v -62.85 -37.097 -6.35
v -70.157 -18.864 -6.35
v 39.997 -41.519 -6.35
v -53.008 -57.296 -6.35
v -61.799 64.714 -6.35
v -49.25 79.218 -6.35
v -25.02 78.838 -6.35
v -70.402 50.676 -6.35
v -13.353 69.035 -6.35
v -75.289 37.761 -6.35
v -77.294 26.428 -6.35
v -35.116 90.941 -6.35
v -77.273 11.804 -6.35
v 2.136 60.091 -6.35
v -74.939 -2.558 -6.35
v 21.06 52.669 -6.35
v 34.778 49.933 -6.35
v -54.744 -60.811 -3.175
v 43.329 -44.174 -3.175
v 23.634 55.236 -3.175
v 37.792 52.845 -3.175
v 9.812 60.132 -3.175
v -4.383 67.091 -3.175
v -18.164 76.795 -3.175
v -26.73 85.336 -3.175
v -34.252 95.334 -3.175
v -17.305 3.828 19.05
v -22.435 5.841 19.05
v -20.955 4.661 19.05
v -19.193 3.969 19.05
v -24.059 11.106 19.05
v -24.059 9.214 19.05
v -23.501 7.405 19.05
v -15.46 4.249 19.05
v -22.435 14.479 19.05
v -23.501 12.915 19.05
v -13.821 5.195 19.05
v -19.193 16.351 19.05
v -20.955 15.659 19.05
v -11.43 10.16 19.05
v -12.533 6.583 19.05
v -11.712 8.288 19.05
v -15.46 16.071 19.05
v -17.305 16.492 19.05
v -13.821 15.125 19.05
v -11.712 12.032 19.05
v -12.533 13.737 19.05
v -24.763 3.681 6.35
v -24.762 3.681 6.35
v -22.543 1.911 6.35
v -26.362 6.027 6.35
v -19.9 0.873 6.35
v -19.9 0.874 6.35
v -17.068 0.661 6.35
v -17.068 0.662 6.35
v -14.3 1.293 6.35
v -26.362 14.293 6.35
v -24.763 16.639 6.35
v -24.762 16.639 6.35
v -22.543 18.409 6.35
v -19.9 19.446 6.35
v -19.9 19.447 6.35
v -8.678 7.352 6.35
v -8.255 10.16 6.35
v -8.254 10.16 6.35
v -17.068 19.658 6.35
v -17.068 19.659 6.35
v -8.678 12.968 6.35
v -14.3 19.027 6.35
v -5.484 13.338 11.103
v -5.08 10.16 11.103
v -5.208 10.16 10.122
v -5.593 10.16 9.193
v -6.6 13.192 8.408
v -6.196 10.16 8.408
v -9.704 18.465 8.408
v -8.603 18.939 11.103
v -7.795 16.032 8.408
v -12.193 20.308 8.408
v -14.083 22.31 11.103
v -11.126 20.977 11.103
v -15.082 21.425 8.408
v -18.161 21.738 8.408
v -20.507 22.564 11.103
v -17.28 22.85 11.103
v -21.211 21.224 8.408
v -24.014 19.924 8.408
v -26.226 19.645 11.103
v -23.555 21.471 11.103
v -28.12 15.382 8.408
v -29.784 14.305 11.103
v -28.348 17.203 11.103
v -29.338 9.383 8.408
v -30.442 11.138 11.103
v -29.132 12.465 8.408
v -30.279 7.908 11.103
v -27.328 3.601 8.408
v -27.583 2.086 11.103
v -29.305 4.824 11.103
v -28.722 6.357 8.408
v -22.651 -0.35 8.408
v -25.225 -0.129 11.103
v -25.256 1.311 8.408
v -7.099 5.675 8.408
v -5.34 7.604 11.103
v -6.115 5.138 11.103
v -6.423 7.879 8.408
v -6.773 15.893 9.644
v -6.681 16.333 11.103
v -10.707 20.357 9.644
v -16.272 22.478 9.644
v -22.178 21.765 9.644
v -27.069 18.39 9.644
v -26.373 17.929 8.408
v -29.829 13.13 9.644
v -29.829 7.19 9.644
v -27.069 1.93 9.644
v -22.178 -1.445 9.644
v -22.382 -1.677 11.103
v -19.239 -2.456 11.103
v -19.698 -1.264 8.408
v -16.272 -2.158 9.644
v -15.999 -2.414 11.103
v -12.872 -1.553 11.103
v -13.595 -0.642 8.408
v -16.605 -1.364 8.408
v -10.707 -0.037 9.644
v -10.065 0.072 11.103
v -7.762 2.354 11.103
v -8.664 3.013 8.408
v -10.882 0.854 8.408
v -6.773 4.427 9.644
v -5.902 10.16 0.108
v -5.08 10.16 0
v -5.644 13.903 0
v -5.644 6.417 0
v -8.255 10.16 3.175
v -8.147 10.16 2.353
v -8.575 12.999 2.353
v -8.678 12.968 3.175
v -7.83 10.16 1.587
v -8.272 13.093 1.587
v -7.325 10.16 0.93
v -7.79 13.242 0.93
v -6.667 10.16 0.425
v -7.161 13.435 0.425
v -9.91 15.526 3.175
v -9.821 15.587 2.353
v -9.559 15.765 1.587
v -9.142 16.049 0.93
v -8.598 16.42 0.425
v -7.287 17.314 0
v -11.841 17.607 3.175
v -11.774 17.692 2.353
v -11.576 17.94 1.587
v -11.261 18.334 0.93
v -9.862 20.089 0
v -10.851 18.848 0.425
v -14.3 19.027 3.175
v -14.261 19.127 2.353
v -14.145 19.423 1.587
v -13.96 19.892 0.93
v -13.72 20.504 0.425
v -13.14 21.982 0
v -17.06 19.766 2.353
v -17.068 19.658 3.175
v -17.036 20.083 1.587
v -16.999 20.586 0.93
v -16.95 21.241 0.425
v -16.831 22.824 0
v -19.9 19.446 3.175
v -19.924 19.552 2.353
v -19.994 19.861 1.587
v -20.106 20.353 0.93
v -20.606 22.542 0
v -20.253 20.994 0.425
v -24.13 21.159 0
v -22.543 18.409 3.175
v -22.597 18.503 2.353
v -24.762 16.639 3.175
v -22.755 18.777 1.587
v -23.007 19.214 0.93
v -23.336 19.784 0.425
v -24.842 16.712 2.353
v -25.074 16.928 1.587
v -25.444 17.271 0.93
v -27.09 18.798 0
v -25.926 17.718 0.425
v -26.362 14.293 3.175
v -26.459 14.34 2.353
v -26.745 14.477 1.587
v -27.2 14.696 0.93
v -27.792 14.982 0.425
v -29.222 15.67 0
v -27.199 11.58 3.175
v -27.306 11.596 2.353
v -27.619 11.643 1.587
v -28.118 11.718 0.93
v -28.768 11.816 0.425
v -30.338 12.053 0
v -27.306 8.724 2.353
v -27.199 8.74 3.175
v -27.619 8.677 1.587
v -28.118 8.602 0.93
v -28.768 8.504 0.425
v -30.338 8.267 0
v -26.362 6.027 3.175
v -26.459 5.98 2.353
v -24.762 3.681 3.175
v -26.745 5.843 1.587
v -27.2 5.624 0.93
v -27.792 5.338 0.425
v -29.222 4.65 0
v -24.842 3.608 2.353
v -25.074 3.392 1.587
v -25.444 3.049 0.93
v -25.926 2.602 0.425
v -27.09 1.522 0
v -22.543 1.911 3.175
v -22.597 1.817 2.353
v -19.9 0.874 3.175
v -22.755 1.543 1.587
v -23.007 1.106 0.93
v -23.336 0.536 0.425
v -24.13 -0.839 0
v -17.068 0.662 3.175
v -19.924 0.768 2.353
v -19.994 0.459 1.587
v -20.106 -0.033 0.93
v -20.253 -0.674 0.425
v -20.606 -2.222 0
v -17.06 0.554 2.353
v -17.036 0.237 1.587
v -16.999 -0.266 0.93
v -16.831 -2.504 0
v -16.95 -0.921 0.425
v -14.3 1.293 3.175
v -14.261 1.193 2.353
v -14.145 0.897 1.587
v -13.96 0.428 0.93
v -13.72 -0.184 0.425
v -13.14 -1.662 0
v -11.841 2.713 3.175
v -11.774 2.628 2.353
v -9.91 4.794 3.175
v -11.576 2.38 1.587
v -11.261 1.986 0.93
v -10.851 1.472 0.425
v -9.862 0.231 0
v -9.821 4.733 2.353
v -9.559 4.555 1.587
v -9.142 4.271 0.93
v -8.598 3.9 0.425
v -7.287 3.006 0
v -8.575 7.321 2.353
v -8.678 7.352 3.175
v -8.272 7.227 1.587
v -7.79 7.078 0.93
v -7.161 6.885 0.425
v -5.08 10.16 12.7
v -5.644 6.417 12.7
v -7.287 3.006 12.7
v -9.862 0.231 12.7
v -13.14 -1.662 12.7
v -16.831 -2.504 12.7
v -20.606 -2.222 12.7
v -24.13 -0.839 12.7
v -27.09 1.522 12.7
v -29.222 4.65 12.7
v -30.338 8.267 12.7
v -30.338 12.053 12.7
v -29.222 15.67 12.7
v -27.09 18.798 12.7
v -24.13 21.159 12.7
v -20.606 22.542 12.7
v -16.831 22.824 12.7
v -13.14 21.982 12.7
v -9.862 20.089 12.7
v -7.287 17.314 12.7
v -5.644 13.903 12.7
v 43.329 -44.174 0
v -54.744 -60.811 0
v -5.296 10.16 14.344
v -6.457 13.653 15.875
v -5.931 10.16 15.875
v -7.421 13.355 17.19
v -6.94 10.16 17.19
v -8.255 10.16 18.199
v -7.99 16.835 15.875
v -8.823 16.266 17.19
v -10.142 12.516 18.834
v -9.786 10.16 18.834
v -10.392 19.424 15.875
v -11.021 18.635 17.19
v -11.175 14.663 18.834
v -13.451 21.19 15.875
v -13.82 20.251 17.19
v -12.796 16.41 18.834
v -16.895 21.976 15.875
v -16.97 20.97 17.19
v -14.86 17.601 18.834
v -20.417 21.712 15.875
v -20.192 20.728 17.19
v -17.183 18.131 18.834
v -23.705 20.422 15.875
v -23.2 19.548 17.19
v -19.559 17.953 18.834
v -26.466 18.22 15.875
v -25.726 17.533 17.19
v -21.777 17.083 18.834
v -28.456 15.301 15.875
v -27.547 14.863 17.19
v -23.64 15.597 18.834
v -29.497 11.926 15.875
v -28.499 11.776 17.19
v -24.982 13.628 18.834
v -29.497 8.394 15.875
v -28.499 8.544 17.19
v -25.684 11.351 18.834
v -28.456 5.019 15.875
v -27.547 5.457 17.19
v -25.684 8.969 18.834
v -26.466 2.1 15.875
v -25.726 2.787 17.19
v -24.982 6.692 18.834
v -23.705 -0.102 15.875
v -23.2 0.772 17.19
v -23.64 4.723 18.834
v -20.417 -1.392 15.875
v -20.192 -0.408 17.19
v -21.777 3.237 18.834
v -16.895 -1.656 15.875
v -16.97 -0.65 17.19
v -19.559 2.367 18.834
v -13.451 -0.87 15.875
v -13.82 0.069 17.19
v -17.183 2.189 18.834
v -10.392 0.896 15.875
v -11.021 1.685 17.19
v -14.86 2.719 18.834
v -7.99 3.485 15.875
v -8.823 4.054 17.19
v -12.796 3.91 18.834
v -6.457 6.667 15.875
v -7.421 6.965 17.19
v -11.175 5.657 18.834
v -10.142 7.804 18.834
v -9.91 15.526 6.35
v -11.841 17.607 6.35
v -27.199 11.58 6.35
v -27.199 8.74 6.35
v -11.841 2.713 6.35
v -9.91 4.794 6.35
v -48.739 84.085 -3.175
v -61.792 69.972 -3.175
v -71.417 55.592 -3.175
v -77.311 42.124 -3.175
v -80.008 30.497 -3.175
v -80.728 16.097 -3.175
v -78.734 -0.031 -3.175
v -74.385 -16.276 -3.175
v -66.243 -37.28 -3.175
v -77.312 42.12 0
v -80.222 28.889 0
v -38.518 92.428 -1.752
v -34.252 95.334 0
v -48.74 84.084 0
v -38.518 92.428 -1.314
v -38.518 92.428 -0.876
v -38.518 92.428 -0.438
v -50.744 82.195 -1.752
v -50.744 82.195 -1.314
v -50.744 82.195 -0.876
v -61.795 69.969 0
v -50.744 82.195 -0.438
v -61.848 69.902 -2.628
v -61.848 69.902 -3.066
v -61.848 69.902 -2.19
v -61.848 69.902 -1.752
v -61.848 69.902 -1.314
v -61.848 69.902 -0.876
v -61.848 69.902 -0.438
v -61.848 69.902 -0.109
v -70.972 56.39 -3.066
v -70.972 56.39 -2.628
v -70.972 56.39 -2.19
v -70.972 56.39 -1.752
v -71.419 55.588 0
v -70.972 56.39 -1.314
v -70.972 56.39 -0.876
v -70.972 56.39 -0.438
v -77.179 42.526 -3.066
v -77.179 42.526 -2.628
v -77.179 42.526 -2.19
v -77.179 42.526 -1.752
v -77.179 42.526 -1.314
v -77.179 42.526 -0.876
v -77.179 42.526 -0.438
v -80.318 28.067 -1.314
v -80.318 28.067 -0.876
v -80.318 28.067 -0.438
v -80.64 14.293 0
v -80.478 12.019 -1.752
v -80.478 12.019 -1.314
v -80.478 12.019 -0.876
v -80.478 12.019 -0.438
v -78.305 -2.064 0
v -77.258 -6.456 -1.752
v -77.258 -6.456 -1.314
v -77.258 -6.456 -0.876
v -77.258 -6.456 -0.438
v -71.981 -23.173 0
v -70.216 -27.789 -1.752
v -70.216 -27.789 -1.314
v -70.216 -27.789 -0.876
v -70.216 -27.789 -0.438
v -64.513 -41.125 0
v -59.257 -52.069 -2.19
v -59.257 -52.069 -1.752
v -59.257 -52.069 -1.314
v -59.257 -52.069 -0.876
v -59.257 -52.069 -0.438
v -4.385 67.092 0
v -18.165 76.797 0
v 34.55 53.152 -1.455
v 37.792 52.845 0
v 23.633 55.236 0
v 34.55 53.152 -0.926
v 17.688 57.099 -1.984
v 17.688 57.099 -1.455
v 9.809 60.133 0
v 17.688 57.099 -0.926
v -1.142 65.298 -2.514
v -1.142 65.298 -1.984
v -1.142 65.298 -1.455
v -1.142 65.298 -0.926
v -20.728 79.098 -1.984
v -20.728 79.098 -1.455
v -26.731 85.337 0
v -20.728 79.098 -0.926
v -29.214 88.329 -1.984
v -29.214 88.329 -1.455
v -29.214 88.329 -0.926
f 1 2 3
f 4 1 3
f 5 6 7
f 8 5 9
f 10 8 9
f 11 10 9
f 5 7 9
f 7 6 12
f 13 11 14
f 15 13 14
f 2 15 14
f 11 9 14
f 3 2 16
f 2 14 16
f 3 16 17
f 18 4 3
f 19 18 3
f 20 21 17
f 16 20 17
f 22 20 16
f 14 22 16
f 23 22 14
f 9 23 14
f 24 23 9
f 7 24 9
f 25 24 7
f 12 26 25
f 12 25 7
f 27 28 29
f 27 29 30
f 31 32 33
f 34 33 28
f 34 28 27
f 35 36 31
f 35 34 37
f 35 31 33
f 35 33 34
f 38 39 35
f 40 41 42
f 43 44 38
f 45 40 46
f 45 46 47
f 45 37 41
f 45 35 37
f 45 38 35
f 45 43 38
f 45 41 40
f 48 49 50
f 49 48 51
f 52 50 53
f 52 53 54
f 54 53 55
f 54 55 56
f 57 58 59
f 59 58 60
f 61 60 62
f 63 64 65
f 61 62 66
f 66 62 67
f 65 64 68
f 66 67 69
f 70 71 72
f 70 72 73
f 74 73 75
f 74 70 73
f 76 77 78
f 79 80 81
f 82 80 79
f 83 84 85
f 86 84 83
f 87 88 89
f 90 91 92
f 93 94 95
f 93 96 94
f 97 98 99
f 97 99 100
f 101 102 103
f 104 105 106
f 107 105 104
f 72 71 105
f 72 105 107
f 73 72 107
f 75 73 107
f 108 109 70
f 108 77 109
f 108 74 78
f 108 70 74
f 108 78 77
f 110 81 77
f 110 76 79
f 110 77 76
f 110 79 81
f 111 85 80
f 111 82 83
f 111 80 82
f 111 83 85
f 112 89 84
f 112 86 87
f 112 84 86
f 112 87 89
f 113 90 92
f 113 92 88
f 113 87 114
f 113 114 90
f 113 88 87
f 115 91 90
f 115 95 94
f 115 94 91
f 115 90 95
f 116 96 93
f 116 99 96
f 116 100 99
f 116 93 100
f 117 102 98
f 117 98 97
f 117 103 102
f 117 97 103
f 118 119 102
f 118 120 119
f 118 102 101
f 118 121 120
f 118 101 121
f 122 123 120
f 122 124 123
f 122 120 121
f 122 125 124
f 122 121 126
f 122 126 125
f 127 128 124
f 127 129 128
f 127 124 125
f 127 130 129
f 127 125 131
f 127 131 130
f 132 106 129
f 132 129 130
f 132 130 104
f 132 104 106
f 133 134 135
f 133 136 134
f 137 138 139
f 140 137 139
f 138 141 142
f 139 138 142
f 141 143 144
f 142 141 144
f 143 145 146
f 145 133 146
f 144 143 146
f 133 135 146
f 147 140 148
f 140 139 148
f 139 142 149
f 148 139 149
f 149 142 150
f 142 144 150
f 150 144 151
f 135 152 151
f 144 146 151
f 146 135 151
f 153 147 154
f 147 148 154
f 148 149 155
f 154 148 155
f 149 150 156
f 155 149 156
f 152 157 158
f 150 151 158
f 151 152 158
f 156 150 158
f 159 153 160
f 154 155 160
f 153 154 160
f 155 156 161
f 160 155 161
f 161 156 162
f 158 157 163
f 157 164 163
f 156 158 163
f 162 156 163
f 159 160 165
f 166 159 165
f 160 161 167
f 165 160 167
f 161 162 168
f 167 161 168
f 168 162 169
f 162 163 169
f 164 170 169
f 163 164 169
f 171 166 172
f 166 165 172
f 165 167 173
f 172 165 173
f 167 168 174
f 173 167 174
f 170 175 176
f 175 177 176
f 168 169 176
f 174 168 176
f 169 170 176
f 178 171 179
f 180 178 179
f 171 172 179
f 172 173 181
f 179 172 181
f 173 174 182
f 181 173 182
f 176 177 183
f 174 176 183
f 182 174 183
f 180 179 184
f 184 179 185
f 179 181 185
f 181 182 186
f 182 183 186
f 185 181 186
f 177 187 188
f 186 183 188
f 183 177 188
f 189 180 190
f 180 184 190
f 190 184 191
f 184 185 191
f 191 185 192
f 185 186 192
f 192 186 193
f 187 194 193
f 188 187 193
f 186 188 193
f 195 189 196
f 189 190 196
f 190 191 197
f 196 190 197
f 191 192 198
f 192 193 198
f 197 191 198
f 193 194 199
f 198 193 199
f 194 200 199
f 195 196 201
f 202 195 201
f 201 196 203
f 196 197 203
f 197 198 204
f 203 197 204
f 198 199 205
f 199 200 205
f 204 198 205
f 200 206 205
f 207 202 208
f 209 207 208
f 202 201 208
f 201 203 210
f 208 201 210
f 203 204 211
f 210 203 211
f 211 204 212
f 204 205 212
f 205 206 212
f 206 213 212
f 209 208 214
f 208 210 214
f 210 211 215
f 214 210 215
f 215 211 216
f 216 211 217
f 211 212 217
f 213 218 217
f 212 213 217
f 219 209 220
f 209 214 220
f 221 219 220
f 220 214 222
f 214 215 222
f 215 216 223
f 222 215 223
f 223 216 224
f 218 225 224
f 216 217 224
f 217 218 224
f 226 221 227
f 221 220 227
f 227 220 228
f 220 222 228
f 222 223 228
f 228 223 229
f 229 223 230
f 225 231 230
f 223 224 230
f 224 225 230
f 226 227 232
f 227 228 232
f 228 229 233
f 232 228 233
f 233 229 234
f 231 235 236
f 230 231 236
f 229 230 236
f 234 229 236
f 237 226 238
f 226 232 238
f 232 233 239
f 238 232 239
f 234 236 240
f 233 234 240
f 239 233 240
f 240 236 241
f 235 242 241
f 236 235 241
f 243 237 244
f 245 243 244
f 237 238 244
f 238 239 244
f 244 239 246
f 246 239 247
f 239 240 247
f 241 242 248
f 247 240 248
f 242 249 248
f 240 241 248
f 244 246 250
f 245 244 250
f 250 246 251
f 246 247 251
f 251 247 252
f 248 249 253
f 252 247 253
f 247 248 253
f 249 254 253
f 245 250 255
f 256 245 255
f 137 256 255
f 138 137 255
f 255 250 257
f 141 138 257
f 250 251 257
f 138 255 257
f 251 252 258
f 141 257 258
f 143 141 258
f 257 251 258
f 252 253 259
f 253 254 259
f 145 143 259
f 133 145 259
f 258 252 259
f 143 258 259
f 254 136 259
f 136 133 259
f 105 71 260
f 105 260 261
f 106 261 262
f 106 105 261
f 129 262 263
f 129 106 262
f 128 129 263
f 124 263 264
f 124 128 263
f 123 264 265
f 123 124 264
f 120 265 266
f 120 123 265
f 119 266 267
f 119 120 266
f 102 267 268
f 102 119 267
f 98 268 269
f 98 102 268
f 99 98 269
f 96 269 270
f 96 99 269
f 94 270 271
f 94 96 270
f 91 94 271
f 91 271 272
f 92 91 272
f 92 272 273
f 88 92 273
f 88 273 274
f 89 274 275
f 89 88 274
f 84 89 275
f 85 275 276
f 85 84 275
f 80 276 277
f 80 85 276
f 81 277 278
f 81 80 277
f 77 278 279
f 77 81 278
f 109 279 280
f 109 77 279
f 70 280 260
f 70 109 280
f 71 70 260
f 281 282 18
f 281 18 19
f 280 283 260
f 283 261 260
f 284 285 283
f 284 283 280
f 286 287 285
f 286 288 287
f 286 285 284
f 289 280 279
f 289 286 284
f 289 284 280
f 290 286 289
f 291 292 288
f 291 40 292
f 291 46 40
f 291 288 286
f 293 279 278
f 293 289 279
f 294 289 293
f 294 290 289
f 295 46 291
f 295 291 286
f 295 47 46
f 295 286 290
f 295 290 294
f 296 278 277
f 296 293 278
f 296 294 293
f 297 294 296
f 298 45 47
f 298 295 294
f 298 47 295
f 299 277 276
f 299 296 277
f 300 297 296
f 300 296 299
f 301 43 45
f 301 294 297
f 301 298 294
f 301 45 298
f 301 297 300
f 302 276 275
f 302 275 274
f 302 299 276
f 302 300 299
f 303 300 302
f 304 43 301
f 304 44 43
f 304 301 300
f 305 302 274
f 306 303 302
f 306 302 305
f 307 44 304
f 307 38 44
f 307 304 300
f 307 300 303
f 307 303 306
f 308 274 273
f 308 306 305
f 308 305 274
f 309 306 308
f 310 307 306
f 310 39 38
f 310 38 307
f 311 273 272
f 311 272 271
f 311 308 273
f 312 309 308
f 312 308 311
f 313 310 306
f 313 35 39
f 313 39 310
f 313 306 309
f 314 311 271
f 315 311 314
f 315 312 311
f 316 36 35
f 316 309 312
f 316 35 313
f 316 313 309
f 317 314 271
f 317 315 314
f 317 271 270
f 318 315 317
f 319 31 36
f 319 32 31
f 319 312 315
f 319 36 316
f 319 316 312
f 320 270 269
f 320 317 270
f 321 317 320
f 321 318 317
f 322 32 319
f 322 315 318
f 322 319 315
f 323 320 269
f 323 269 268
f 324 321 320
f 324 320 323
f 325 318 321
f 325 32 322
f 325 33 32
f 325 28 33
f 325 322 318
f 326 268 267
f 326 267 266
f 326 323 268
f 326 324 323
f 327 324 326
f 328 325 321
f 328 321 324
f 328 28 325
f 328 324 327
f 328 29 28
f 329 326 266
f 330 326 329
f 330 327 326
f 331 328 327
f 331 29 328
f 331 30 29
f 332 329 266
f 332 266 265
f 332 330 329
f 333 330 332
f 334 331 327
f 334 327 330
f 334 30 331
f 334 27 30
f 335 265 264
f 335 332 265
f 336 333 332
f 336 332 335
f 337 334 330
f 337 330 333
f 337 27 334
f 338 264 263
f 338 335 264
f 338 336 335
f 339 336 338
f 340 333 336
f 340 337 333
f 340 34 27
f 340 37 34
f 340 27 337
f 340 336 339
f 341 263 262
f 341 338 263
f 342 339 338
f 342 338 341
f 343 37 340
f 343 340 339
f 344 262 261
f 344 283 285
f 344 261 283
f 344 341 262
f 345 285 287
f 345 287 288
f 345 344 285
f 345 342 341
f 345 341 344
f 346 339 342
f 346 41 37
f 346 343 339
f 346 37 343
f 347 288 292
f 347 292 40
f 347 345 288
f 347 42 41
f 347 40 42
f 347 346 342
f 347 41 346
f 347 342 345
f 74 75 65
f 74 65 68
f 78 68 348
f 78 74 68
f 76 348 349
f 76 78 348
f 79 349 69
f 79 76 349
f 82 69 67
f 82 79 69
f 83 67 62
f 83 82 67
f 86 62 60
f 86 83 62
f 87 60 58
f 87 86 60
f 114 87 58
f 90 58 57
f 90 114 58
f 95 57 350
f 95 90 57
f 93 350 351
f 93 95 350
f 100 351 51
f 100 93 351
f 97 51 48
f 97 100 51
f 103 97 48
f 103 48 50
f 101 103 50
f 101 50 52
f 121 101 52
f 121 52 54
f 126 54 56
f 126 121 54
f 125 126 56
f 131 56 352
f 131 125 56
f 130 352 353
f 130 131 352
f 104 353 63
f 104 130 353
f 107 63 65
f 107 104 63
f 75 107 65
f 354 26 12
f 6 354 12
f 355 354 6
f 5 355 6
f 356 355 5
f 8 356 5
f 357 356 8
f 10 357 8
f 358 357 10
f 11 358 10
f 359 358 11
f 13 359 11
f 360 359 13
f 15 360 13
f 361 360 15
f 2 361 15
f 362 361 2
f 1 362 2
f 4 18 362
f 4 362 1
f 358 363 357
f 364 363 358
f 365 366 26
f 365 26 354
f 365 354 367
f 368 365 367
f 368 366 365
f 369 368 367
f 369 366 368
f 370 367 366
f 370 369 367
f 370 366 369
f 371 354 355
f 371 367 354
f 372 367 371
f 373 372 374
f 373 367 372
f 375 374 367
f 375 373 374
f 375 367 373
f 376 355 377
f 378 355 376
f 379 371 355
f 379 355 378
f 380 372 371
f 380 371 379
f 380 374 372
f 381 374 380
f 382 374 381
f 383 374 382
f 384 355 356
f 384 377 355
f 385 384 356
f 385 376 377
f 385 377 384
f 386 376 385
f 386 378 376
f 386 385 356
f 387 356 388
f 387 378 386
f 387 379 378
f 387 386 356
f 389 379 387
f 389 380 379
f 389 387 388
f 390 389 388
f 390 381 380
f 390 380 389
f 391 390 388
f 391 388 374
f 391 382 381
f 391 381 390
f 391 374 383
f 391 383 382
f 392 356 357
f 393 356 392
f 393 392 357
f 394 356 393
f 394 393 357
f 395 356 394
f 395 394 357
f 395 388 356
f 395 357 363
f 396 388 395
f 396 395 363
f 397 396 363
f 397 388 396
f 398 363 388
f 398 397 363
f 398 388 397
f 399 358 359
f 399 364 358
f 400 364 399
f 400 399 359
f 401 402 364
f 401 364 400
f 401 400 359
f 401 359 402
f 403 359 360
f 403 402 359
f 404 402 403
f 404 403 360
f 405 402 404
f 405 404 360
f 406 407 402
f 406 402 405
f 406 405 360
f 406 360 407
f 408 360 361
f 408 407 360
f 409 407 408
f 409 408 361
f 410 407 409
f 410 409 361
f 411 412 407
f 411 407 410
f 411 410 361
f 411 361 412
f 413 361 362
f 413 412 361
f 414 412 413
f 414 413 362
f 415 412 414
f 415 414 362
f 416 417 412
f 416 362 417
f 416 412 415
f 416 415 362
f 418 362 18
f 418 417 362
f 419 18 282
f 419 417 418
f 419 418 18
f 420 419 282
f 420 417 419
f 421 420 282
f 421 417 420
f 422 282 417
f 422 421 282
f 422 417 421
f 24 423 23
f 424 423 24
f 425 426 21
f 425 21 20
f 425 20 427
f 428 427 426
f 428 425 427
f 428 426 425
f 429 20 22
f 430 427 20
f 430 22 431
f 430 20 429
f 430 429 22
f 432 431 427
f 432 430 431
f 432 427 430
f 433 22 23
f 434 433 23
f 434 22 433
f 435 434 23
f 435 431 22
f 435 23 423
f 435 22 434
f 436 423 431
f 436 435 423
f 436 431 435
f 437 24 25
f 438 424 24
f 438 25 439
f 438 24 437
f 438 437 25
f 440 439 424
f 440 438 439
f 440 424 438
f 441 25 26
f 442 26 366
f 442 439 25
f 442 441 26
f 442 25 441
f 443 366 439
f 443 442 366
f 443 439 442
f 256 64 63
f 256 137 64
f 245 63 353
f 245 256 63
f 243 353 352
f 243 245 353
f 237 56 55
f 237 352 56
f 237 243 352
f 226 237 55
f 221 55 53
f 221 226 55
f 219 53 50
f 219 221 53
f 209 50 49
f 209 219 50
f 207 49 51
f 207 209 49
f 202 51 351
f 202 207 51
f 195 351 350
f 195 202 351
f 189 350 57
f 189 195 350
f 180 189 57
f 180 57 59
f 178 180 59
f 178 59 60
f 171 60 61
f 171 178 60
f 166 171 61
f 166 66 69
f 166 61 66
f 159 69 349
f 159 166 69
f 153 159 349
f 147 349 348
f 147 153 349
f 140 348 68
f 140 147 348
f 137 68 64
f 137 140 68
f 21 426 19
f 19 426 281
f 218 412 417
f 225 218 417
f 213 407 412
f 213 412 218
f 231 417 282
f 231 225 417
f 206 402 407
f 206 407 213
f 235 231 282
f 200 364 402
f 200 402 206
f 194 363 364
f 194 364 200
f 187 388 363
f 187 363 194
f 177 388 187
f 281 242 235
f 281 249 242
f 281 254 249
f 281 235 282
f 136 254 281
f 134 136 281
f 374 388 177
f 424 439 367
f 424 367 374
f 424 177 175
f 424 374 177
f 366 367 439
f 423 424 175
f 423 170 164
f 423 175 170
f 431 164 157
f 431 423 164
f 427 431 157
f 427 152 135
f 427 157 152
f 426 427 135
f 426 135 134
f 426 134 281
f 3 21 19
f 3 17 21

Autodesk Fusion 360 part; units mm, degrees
sketch "MaskV2" plane through (0, 0, 0) normal (0, 0, 1) x (1, 0, 0)
  spline S0 degree 5 poles (-34.2523, 95.3336) (-35.2526, 94.6891) (-37.2409, 93.3658) (-40.1864, 91.2783) (-44.0399, 88.2891) (-48.7276, 84.2113) (-53.2705, 79.8034) (-57.6389, 75.091) (-61.7831, 70.123) (-65.6362, 64.9683) (-69.1279, 59.6986) (-72.1952, 54.3745) (-74.7946, 49.0314) (-76.9151, 43.6626) (-78.5689, 38.2286) (-79.7757, 32.67) (-80.5515, 26.9191) (-80.8926, 20.9126) (-80.7756, 14.597) (-80.1673, 7.9268) (-79.031, 0.8656) (-77.3347, -6.6132) (-75.0591, -14.5257) (-72.1957, -22.8797) (-68.7429, -31.6769) (-64.7038, -40.9156) (-61.0077, -48.6568) (-57.9762, -54.6582) (-55.8403, -58.7457) (-54.7436, -60.8111) knots 0 0 0 0 0 0 0.04 0.08 0.12 0.16 0.2 0.24 0.28 0.32 0.36 0.4 0.44 0.48 0.52 0.56 0.6 0.64 0.68 0.72 0.76 0.8 0.84 0.88 0.92 0.96 1 1 1 1 1 1
  spline S1 degree 5 poles (69.5672, 53.3007) (67.8702, 53.1838) (64.548, 52.9705) (59.7802, 52.7121) (53.8562, 52.4908) (47.173, 52.4234) (41.1946, 52.571) (35.8717, 52.9412) (31.1095, 53.5427) (26.7456, 54.3847) (22.5564, 55.477) (18.3169, 56.8318) (13.8423, 58.4658) (9.0491, 60.4018) (3.9674, 62.668) (-1.3048, 65.2946) (-6.6318, 68.31) (-11.8738, 71.7374) (-16.9248, 75.5895) (-21.7215, 79.8688) (-26.2284, 84.5726) (-29.5909, 88.6705) (-31.975, 91.93) (-33.5034, 94.1853) (-34.2523, 95.3336) knots 0 0 0 0 0 0 0.05 0.1 0.15 0.2 0.25 0.3 0.35 0.4 0.45 0.5 0.55 0.6 0.65 0.7 0.75 0.8 0.85 0.9 0.95 1 1 1 1 1 1
  line L0 (37.7916, 52.8446) -> (43.3291, -44.1745)
  line L1 (-54.7436, -60.8111) -> (75.4385, -38.7276)
  line L2 (69.5672, 53.3007) -> (75.4385, -38.7276)
  circle A0 centre (-17.78, 10.16) radius 9.525
  circle A1 centre (-17.78, 10.16) radius 12.7
  line L3 (-40.1142, -47.6041) -> (19.676, -37.0614) construction
  line L4 (19.676, -37.0614) -> (16.368, -18.3009) construction
  line L5 (16.368, -18.3009) -> (-43.4222, -28.8435) construction
  line L6 (-43.4222, -28.8435) -> (-40.1142, -47.6041) construction
  dimension "d1" = 19.05
  dimension "d2" = 25.4
extrude "Extrude1" add sketch "MaskV2" against normal blind 6.35 contours S0 S1 L0 L1 | A0 | A1
extrude "Extrude2" add sketch "MaskV2" along normal blind 19.05 contours A0
extrude "Extrude3" add sketch "MaskV2" along normal blind 12.7 from surface at 6.35 contours A1
fillet "Fillet1" radius 6.35 1 edges at (-29.6206, 5.5675, 19.05)
chamfer "Chamfer1" distance 3.175 angle 45 1 edges at (-29.6206, 5.5675, 6.35)
fillet "Fillet2" radius 3.81 1 edges at (-29.6206, 14.7525, 9.525)
fillet "Fillet3" radius 3.175 1 edges at (-26.6604, 13.6044, 0)
chamfer "Chamfer3" distance 3.175 angle 45 4 edges at (-5.7072, -52.4928, -6.35) (40.5603, 4.3351, -6.35) (2.2203, 63.5787, -6.35) (-79.1174, 35.4295, -6.35)
